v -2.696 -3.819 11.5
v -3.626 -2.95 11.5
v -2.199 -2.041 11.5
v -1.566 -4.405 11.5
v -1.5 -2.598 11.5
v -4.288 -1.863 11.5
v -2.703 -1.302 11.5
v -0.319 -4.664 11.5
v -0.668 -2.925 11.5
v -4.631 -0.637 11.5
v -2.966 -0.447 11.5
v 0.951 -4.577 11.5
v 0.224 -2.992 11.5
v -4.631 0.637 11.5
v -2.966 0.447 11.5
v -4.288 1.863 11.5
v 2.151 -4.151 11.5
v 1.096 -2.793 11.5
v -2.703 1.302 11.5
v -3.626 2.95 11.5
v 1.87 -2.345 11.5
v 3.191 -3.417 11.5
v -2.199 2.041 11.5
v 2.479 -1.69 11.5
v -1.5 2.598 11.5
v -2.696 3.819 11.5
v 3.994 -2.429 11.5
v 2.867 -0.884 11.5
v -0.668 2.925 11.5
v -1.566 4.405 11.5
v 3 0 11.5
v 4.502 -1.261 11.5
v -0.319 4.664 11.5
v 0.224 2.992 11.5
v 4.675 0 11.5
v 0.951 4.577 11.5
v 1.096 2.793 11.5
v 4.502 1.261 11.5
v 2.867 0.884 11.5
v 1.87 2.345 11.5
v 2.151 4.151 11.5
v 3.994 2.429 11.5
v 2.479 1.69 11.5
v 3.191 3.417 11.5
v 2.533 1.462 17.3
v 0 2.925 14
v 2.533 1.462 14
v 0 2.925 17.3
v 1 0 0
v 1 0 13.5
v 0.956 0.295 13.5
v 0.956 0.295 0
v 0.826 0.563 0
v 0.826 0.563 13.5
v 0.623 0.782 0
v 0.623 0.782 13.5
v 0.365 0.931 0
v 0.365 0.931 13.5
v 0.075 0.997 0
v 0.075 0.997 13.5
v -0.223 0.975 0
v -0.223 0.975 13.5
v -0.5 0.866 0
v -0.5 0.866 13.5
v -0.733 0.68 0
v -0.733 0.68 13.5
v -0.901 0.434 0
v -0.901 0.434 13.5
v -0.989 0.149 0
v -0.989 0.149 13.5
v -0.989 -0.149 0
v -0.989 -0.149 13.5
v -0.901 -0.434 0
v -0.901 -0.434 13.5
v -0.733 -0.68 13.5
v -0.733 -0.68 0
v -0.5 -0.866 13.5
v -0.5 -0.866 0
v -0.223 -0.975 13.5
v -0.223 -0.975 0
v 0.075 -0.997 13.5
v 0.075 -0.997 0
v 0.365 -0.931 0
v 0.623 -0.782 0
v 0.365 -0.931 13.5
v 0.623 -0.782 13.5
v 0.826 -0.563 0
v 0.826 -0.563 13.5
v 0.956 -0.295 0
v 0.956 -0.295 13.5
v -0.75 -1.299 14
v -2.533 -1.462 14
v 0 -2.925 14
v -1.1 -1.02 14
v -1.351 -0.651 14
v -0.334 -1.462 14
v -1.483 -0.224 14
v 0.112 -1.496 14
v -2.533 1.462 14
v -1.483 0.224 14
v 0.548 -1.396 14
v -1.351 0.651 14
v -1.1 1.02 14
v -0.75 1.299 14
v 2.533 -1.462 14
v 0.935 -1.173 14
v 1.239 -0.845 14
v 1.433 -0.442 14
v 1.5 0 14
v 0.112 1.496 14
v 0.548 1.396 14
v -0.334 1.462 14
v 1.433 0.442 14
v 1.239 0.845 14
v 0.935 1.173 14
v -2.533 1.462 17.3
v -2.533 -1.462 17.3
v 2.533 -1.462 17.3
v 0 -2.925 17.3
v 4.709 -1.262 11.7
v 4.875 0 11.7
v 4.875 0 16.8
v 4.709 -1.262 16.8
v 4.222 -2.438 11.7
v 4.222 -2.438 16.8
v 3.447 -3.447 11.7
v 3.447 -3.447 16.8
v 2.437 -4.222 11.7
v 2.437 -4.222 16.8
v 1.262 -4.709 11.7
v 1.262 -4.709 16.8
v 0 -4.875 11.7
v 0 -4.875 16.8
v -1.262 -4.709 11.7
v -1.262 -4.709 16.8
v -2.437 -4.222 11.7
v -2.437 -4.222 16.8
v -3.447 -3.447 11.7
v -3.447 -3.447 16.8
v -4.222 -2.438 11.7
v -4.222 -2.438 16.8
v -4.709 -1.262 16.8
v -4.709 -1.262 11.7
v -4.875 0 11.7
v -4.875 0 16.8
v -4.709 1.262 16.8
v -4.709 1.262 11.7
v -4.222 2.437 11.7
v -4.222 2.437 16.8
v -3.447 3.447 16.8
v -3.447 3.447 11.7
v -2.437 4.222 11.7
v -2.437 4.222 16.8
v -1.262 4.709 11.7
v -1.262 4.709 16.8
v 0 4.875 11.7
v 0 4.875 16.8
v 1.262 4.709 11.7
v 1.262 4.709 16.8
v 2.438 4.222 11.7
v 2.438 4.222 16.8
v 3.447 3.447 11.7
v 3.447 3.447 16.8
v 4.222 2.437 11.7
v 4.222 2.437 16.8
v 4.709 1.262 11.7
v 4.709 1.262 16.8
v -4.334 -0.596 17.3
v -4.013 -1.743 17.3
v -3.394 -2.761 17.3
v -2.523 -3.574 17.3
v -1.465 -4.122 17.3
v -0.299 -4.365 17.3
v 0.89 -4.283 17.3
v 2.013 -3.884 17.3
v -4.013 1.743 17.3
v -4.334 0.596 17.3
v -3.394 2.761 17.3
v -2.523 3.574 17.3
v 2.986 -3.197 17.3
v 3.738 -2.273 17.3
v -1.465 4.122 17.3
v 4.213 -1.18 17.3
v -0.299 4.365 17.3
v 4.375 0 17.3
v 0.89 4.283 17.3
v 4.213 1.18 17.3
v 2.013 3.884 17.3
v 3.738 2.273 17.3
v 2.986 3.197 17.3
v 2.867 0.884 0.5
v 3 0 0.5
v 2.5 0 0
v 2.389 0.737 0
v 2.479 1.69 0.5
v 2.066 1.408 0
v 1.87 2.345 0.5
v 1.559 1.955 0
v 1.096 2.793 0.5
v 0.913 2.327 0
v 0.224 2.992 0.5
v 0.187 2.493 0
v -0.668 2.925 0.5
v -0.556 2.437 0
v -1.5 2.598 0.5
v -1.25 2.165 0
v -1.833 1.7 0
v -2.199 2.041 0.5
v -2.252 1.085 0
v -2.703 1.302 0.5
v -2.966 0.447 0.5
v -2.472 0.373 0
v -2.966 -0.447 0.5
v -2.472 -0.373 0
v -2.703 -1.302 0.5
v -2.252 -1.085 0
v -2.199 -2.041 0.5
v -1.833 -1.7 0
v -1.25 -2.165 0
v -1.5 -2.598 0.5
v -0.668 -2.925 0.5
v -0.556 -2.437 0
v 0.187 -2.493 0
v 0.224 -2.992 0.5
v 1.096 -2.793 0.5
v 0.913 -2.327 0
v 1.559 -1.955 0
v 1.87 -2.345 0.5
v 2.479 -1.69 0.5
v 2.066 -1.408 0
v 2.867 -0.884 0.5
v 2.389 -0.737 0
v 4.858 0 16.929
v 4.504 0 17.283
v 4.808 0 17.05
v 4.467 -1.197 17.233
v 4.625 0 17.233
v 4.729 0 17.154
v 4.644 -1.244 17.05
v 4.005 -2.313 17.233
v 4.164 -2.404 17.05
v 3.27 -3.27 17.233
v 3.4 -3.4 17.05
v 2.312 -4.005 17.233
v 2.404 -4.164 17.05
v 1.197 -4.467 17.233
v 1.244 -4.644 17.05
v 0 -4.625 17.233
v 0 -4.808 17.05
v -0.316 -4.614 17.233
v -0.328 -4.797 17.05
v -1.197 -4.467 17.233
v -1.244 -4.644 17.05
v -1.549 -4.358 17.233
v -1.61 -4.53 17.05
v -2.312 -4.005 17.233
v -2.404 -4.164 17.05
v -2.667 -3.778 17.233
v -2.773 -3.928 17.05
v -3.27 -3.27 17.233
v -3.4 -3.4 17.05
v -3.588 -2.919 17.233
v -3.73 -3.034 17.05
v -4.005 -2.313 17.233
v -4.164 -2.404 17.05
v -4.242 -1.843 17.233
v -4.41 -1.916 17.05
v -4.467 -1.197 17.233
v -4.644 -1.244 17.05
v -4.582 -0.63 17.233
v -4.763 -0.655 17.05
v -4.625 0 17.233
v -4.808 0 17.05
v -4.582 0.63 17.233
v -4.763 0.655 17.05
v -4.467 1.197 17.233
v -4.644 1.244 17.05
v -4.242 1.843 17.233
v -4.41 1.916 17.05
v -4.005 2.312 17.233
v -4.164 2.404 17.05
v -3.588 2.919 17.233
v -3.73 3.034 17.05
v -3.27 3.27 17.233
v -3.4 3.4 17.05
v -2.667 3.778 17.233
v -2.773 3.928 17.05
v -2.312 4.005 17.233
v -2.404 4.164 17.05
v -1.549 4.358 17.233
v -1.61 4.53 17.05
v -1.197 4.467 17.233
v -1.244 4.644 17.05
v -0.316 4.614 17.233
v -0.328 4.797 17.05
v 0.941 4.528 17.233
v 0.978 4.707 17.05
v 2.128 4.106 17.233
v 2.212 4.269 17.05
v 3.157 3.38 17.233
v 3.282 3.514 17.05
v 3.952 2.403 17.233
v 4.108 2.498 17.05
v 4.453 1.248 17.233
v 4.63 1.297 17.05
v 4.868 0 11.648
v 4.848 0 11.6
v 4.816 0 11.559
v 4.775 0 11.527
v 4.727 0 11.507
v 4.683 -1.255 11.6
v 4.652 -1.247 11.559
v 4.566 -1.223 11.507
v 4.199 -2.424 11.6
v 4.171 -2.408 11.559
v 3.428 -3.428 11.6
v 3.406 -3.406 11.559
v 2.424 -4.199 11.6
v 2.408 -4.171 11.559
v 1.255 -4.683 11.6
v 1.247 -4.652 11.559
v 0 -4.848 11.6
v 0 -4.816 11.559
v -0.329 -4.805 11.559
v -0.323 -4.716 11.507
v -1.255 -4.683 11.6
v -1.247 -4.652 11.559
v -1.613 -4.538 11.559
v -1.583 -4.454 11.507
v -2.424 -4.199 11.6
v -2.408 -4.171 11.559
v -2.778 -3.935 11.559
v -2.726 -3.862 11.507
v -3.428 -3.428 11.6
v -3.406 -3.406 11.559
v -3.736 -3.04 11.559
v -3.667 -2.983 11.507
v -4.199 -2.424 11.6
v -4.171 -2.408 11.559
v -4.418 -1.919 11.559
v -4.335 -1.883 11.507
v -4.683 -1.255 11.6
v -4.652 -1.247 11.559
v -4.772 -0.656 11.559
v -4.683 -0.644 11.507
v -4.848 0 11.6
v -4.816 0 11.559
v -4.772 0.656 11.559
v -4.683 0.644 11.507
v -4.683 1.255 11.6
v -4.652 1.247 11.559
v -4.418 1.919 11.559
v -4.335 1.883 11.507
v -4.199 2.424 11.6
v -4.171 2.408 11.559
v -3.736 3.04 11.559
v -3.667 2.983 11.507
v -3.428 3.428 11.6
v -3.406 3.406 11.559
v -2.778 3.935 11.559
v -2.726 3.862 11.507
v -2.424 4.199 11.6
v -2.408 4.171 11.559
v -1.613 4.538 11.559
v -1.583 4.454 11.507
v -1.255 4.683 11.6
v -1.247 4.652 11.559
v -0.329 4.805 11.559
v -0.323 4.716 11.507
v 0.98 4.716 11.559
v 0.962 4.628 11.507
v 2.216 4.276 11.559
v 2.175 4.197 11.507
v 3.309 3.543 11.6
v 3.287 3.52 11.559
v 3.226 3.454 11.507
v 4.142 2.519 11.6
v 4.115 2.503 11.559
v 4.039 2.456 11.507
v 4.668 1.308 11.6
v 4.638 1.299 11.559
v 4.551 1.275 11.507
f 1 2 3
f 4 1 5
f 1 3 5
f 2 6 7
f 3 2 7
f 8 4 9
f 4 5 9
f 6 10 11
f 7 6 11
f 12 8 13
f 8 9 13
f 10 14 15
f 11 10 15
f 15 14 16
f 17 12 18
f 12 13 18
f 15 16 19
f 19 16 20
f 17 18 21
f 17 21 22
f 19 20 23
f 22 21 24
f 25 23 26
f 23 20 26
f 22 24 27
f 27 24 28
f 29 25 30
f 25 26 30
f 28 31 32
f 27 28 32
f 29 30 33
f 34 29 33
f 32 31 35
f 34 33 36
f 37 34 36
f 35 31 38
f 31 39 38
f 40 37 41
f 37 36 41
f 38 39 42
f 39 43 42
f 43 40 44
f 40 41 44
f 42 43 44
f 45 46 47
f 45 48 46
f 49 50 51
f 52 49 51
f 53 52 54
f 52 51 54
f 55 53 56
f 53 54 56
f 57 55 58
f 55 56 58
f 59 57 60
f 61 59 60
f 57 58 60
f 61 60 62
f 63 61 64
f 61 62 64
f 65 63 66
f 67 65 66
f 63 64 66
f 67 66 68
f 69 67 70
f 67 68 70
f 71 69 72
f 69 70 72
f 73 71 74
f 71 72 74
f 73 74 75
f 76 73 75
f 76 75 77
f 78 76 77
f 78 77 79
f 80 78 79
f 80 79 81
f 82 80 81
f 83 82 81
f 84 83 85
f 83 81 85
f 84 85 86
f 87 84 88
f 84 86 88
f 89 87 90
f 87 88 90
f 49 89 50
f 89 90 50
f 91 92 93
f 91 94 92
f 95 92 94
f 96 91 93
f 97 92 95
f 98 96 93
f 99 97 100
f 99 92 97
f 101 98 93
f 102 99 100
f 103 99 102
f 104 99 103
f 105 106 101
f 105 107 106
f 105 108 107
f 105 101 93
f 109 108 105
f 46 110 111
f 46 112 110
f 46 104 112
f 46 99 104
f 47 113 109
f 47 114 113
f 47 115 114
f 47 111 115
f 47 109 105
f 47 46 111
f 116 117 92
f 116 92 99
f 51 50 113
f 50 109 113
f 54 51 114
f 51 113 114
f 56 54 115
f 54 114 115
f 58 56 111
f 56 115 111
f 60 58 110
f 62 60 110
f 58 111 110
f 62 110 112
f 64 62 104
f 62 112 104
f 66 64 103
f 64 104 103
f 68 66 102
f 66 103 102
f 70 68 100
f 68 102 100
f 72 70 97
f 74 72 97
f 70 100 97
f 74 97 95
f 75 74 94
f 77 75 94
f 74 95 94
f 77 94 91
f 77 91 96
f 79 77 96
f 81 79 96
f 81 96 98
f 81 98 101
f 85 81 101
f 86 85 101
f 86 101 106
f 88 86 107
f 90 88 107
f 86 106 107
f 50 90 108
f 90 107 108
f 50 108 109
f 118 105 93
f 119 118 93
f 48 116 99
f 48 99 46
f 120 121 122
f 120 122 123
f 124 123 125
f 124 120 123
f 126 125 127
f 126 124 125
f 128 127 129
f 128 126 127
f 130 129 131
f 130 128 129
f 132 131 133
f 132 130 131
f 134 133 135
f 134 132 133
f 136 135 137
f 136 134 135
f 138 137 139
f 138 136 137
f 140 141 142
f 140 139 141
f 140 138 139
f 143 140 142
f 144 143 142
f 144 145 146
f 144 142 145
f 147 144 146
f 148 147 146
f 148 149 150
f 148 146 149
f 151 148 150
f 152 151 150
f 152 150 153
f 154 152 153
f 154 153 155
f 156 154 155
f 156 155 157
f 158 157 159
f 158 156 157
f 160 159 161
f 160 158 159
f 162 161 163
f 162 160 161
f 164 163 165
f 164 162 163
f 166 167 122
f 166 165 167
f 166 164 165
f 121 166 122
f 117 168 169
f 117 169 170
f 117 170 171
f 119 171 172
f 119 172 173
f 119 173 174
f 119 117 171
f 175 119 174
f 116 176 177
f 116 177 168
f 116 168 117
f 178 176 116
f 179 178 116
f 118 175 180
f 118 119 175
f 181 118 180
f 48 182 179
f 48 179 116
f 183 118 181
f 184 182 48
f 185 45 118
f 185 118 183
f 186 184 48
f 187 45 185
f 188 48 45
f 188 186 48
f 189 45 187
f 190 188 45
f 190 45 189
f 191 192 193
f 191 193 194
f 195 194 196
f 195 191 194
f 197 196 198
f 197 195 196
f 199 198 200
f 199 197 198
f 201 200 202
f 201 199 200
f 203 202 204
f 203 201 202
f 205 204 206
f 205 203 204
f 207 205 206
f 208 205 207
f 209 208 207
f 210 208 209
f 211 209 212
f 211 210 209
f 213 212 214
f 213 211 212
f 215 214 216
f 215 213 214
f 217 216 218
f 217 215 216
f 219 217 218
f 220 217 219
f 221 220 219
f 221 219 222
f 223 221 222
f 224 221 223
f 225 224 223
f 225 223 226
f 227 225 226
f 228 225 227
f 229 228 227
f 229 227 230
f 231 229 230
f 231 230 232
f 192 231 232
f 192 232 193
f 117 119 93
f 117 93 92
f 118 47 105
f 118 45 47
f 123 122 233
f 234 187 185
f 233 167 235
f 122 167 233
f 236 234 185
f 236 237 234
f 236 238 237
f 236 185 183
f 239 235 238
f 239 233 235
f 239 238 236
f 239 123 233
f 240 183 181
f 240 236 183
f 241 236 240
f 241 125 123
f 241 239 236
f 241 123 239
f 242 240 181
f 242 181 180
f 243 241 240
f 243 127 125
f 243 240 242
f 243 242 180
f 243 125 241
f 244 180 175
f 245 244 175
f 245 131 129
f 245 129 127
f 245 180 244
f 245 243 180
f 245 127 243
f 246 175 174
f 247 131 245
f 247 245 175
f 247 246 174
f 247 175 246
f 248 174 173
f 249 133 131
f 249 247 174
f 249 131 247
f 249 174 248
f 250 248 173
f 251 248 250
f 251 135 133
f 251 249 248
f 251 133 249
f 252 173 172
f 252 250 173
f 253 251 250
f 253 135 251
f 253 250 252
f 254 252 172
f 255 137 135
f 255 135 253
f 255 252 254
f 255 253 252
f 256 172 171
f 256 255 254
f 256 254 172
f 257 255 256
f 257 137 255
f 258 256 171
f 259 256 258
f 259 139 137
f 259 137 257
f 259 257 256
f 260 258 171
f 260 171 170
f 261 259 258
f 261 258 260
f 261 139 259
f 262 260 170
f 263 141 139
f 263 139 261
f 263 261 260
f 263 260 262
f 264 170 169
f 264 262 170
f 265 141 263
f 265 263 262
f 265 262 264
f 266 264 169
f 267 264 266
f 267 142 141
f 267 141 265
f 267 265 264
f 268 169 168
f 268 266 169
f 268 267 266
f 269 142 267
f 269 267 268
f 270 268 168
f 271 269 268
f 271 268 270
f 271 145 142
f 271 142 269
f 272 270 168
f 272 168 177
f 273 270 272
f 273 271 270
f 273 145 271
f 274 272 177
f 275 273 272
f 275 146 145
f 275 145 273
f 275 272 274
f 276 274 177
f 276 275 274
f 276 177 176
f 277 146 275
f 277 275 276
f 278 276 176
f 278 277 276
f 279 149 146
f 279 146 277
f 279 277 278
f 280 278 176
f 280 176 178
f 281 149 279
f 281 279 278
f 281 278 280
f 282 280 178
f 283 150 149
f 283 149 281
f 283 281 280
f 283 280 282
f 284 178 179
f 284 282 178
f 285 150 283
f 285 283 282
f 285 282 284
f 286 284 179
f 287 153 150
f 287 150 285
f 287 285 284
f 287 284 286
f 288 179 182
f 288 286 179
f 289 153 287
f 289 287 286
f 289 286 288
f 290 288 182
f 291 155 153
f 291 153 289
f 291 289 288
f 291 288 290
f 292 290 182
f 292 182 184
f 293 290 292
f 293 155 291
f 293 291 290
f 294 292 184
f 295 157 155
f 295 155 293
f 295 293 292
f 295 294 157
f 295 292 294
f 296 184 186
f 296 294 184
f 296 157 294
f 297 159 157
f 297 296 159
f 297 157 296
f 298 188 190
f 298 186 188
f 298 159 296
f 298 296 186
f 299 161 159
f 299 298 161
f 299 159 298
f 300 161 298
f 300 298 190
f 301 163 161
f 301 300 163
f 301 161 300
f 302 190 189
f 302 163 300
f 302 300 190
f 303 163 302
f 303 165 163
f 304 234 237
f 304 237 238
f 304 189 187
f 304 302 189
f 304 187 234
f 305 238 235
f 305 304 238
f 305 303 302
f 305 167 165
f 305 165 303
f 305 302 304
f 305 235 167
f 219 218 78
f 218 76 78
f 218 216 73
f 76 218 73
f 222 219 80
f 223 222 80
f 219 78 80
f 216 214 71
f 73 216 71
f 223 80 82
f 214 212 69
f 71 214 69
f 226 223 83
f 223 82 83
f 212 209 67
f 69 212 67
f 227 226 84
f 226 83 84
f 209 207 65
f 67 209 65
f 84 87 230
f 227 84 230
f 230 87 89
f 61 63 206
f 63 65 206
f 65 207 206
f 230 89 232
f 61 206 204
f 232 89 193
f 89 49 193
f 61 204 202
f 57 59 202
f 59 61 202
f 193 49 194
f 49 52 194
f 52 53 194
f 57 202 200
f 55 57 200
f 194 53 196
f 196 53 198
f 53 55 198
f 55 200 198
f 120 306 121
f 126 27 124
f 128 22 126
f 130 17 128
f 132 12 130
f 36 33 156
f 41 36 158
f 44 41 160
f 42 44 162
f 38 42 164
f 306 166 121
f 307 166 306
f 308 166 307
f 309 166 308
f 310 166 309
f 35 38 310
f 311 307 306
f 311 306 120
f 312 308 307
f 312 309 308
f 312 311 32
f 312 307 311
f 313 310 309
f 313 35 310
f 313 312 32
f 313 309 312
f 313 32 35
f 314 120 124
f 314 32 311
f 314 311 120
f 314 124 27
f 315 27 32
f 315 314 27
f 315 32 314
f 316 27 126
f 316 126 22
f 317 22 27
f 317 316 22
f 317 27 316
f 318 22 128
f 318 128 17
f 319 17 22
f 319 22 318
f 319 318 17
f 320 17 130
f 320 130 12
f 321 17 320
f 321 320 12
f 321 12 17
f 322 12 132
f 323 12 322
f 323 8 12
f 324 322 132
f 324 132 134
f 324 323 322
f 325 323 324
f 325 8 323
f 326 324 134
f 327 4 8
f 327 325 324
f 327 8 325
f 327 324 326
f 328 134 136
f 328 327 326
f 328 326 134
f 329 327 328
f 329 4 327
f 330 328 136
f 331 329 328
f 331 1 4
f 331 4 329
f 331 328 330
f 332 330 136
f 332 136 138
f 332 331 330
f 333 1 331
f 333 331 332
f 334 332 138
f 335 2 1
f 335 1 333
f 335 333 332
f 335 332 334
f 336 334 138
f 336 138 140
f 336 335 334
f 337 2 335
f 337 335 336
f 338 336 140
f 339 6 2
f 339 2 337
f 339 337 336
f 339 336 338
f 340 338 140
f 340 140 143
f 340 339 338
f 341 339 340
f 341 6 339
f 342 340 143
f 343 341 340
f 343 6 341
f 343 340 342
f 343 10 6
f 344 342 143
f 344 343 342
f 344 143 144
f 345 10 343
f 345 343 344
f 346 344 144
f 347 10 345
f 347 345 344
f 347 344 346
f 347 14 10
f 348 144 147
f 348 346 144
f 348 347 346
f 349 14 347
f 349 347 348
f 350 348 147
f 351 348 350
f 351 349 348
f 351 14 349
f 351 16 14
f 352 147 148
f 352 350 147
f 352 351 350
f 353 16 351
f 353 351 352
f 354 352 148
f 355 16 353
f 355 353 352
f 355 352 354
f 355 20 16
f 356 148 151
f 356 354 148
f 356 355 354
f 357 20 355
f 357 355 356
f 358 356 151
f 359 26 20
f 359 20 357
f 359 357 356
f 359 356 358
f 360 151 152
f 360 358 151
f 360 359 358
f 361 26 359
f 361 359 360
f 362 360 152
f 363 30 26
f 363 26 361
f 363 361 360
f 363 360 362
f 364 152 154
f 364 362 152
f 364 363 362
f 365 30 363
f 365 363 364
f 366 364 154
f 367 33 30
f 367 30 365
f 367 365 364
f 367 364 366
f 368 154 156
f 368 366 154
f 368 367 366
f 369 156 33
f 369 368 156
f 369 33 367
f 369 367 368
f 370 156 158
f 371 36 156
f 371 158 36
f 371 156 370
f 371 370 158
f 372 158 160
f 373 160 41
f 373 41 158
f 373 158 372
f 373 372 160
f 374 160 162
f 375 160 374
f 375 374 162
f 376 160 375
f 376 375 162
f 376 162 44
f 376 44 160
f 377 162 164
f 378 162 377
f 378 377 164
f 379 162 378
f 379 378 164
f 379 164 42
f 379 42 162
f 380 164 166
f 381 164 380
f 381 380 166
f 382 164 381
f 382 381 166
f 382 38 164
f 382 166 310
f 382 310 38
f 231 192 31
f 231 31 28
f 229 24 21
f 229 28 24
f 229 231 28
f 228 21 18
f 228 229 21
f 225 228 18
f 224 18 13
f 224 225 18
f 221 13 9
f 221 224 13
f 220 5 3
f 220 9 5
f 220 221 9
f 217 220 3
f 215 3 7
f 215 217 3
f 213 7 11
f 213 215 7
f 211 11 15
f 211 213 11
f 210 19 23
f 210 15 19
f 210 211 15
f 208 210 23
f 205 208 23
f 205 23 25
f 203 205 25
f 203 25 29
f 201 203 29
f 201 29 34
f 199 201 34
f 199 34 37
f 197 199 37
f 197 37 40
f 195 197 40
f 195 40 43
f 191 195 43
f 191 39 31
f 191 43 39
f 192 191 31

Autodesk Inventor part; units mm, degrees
ref_plane "YZ Plane" through (0, 0, 0) normal (1, 0, 0) x (0, 1, 0)
ref_plane "XZ Plane" through (0, 0, 0) normal (0, 1, 0) x (-1, 0, 0)
ref_plane "XY Plane" through (0, 0, 0) normal (0, 0, 1) x (1, 0, 0)
sketch "Sketch1" plane through (0, 0, 0) normal (0, 0, 1) x (1, 0, 0)
  circle A0 centre (0, 0) radius 3
  dimension "d0" = 6
extrude "Extrusion1" add sketch "Sketch1" along normal blind 11.5
sketch "Sketch2" plane through (0, 0, 11.5) normal (0, 0, 1) x (1, 0, 0)
  circle A0 centre (0, 0) radius 4.875
  dimension "d3" = 9.75
extrude "Extrusion2" add sketch "Sketch2" along normal blind 5.8
sketch "Sketch3" plane through (0, 0, 17.3) normal (0, 0, 1) x (1, 0, 0)
  line L0 (2.5331, -1.4625) -> (0, -2.925)
  line L1 (0, -2.925) -> (-2.5331, -1.4625)
  line L2 (-2.5331, -1.4625) -> (-2.5331, 1.4625)
  line L3 (-2.5331, 1.4625) -> (0, 2.925)
  line L4 (0, 2.925) -> (2.5331, 1.4625)
  line L5 (2.5331, 1.4625) -> (2.5331, -1.4625)
  point P0 (0, 0)
  point P1 (0, 0)
  point P2 (2.5331, 0)
  dimension "d6" = 5.85
extrude "Extrusion3" cut sketch "Sketch3" against normal blind 3.3
sketch "Sketch4" plane through (0, 0, 14) normal (0, 0, 1) x (1, 0, 0)
  circle A0 centre (0, 0) radius 1
  dimension "d9" = 2
extrude "Extrusion4" cut sketch "Sketch4" against normal through all
chamfer "Chamfer1" distance 0.5 angle 45 1 edges at (-1, 0, 14)
fillet "Fillet1" radius 0.5 1 edges at (-4.875, 0, 17.3)
fillet "Fillet2" radius 0.2 1 edges at (-4.875, 0, 11.5)
thread "Thread1" size "M6x1" class "6g" standard "ISO Metric profile" full length
chamfer "Chamfer2" distance 0.5 angle 45 1 edges at (-3, 0, 0)
properties part number "fillament guide screw" material "Steel, Alloy"
